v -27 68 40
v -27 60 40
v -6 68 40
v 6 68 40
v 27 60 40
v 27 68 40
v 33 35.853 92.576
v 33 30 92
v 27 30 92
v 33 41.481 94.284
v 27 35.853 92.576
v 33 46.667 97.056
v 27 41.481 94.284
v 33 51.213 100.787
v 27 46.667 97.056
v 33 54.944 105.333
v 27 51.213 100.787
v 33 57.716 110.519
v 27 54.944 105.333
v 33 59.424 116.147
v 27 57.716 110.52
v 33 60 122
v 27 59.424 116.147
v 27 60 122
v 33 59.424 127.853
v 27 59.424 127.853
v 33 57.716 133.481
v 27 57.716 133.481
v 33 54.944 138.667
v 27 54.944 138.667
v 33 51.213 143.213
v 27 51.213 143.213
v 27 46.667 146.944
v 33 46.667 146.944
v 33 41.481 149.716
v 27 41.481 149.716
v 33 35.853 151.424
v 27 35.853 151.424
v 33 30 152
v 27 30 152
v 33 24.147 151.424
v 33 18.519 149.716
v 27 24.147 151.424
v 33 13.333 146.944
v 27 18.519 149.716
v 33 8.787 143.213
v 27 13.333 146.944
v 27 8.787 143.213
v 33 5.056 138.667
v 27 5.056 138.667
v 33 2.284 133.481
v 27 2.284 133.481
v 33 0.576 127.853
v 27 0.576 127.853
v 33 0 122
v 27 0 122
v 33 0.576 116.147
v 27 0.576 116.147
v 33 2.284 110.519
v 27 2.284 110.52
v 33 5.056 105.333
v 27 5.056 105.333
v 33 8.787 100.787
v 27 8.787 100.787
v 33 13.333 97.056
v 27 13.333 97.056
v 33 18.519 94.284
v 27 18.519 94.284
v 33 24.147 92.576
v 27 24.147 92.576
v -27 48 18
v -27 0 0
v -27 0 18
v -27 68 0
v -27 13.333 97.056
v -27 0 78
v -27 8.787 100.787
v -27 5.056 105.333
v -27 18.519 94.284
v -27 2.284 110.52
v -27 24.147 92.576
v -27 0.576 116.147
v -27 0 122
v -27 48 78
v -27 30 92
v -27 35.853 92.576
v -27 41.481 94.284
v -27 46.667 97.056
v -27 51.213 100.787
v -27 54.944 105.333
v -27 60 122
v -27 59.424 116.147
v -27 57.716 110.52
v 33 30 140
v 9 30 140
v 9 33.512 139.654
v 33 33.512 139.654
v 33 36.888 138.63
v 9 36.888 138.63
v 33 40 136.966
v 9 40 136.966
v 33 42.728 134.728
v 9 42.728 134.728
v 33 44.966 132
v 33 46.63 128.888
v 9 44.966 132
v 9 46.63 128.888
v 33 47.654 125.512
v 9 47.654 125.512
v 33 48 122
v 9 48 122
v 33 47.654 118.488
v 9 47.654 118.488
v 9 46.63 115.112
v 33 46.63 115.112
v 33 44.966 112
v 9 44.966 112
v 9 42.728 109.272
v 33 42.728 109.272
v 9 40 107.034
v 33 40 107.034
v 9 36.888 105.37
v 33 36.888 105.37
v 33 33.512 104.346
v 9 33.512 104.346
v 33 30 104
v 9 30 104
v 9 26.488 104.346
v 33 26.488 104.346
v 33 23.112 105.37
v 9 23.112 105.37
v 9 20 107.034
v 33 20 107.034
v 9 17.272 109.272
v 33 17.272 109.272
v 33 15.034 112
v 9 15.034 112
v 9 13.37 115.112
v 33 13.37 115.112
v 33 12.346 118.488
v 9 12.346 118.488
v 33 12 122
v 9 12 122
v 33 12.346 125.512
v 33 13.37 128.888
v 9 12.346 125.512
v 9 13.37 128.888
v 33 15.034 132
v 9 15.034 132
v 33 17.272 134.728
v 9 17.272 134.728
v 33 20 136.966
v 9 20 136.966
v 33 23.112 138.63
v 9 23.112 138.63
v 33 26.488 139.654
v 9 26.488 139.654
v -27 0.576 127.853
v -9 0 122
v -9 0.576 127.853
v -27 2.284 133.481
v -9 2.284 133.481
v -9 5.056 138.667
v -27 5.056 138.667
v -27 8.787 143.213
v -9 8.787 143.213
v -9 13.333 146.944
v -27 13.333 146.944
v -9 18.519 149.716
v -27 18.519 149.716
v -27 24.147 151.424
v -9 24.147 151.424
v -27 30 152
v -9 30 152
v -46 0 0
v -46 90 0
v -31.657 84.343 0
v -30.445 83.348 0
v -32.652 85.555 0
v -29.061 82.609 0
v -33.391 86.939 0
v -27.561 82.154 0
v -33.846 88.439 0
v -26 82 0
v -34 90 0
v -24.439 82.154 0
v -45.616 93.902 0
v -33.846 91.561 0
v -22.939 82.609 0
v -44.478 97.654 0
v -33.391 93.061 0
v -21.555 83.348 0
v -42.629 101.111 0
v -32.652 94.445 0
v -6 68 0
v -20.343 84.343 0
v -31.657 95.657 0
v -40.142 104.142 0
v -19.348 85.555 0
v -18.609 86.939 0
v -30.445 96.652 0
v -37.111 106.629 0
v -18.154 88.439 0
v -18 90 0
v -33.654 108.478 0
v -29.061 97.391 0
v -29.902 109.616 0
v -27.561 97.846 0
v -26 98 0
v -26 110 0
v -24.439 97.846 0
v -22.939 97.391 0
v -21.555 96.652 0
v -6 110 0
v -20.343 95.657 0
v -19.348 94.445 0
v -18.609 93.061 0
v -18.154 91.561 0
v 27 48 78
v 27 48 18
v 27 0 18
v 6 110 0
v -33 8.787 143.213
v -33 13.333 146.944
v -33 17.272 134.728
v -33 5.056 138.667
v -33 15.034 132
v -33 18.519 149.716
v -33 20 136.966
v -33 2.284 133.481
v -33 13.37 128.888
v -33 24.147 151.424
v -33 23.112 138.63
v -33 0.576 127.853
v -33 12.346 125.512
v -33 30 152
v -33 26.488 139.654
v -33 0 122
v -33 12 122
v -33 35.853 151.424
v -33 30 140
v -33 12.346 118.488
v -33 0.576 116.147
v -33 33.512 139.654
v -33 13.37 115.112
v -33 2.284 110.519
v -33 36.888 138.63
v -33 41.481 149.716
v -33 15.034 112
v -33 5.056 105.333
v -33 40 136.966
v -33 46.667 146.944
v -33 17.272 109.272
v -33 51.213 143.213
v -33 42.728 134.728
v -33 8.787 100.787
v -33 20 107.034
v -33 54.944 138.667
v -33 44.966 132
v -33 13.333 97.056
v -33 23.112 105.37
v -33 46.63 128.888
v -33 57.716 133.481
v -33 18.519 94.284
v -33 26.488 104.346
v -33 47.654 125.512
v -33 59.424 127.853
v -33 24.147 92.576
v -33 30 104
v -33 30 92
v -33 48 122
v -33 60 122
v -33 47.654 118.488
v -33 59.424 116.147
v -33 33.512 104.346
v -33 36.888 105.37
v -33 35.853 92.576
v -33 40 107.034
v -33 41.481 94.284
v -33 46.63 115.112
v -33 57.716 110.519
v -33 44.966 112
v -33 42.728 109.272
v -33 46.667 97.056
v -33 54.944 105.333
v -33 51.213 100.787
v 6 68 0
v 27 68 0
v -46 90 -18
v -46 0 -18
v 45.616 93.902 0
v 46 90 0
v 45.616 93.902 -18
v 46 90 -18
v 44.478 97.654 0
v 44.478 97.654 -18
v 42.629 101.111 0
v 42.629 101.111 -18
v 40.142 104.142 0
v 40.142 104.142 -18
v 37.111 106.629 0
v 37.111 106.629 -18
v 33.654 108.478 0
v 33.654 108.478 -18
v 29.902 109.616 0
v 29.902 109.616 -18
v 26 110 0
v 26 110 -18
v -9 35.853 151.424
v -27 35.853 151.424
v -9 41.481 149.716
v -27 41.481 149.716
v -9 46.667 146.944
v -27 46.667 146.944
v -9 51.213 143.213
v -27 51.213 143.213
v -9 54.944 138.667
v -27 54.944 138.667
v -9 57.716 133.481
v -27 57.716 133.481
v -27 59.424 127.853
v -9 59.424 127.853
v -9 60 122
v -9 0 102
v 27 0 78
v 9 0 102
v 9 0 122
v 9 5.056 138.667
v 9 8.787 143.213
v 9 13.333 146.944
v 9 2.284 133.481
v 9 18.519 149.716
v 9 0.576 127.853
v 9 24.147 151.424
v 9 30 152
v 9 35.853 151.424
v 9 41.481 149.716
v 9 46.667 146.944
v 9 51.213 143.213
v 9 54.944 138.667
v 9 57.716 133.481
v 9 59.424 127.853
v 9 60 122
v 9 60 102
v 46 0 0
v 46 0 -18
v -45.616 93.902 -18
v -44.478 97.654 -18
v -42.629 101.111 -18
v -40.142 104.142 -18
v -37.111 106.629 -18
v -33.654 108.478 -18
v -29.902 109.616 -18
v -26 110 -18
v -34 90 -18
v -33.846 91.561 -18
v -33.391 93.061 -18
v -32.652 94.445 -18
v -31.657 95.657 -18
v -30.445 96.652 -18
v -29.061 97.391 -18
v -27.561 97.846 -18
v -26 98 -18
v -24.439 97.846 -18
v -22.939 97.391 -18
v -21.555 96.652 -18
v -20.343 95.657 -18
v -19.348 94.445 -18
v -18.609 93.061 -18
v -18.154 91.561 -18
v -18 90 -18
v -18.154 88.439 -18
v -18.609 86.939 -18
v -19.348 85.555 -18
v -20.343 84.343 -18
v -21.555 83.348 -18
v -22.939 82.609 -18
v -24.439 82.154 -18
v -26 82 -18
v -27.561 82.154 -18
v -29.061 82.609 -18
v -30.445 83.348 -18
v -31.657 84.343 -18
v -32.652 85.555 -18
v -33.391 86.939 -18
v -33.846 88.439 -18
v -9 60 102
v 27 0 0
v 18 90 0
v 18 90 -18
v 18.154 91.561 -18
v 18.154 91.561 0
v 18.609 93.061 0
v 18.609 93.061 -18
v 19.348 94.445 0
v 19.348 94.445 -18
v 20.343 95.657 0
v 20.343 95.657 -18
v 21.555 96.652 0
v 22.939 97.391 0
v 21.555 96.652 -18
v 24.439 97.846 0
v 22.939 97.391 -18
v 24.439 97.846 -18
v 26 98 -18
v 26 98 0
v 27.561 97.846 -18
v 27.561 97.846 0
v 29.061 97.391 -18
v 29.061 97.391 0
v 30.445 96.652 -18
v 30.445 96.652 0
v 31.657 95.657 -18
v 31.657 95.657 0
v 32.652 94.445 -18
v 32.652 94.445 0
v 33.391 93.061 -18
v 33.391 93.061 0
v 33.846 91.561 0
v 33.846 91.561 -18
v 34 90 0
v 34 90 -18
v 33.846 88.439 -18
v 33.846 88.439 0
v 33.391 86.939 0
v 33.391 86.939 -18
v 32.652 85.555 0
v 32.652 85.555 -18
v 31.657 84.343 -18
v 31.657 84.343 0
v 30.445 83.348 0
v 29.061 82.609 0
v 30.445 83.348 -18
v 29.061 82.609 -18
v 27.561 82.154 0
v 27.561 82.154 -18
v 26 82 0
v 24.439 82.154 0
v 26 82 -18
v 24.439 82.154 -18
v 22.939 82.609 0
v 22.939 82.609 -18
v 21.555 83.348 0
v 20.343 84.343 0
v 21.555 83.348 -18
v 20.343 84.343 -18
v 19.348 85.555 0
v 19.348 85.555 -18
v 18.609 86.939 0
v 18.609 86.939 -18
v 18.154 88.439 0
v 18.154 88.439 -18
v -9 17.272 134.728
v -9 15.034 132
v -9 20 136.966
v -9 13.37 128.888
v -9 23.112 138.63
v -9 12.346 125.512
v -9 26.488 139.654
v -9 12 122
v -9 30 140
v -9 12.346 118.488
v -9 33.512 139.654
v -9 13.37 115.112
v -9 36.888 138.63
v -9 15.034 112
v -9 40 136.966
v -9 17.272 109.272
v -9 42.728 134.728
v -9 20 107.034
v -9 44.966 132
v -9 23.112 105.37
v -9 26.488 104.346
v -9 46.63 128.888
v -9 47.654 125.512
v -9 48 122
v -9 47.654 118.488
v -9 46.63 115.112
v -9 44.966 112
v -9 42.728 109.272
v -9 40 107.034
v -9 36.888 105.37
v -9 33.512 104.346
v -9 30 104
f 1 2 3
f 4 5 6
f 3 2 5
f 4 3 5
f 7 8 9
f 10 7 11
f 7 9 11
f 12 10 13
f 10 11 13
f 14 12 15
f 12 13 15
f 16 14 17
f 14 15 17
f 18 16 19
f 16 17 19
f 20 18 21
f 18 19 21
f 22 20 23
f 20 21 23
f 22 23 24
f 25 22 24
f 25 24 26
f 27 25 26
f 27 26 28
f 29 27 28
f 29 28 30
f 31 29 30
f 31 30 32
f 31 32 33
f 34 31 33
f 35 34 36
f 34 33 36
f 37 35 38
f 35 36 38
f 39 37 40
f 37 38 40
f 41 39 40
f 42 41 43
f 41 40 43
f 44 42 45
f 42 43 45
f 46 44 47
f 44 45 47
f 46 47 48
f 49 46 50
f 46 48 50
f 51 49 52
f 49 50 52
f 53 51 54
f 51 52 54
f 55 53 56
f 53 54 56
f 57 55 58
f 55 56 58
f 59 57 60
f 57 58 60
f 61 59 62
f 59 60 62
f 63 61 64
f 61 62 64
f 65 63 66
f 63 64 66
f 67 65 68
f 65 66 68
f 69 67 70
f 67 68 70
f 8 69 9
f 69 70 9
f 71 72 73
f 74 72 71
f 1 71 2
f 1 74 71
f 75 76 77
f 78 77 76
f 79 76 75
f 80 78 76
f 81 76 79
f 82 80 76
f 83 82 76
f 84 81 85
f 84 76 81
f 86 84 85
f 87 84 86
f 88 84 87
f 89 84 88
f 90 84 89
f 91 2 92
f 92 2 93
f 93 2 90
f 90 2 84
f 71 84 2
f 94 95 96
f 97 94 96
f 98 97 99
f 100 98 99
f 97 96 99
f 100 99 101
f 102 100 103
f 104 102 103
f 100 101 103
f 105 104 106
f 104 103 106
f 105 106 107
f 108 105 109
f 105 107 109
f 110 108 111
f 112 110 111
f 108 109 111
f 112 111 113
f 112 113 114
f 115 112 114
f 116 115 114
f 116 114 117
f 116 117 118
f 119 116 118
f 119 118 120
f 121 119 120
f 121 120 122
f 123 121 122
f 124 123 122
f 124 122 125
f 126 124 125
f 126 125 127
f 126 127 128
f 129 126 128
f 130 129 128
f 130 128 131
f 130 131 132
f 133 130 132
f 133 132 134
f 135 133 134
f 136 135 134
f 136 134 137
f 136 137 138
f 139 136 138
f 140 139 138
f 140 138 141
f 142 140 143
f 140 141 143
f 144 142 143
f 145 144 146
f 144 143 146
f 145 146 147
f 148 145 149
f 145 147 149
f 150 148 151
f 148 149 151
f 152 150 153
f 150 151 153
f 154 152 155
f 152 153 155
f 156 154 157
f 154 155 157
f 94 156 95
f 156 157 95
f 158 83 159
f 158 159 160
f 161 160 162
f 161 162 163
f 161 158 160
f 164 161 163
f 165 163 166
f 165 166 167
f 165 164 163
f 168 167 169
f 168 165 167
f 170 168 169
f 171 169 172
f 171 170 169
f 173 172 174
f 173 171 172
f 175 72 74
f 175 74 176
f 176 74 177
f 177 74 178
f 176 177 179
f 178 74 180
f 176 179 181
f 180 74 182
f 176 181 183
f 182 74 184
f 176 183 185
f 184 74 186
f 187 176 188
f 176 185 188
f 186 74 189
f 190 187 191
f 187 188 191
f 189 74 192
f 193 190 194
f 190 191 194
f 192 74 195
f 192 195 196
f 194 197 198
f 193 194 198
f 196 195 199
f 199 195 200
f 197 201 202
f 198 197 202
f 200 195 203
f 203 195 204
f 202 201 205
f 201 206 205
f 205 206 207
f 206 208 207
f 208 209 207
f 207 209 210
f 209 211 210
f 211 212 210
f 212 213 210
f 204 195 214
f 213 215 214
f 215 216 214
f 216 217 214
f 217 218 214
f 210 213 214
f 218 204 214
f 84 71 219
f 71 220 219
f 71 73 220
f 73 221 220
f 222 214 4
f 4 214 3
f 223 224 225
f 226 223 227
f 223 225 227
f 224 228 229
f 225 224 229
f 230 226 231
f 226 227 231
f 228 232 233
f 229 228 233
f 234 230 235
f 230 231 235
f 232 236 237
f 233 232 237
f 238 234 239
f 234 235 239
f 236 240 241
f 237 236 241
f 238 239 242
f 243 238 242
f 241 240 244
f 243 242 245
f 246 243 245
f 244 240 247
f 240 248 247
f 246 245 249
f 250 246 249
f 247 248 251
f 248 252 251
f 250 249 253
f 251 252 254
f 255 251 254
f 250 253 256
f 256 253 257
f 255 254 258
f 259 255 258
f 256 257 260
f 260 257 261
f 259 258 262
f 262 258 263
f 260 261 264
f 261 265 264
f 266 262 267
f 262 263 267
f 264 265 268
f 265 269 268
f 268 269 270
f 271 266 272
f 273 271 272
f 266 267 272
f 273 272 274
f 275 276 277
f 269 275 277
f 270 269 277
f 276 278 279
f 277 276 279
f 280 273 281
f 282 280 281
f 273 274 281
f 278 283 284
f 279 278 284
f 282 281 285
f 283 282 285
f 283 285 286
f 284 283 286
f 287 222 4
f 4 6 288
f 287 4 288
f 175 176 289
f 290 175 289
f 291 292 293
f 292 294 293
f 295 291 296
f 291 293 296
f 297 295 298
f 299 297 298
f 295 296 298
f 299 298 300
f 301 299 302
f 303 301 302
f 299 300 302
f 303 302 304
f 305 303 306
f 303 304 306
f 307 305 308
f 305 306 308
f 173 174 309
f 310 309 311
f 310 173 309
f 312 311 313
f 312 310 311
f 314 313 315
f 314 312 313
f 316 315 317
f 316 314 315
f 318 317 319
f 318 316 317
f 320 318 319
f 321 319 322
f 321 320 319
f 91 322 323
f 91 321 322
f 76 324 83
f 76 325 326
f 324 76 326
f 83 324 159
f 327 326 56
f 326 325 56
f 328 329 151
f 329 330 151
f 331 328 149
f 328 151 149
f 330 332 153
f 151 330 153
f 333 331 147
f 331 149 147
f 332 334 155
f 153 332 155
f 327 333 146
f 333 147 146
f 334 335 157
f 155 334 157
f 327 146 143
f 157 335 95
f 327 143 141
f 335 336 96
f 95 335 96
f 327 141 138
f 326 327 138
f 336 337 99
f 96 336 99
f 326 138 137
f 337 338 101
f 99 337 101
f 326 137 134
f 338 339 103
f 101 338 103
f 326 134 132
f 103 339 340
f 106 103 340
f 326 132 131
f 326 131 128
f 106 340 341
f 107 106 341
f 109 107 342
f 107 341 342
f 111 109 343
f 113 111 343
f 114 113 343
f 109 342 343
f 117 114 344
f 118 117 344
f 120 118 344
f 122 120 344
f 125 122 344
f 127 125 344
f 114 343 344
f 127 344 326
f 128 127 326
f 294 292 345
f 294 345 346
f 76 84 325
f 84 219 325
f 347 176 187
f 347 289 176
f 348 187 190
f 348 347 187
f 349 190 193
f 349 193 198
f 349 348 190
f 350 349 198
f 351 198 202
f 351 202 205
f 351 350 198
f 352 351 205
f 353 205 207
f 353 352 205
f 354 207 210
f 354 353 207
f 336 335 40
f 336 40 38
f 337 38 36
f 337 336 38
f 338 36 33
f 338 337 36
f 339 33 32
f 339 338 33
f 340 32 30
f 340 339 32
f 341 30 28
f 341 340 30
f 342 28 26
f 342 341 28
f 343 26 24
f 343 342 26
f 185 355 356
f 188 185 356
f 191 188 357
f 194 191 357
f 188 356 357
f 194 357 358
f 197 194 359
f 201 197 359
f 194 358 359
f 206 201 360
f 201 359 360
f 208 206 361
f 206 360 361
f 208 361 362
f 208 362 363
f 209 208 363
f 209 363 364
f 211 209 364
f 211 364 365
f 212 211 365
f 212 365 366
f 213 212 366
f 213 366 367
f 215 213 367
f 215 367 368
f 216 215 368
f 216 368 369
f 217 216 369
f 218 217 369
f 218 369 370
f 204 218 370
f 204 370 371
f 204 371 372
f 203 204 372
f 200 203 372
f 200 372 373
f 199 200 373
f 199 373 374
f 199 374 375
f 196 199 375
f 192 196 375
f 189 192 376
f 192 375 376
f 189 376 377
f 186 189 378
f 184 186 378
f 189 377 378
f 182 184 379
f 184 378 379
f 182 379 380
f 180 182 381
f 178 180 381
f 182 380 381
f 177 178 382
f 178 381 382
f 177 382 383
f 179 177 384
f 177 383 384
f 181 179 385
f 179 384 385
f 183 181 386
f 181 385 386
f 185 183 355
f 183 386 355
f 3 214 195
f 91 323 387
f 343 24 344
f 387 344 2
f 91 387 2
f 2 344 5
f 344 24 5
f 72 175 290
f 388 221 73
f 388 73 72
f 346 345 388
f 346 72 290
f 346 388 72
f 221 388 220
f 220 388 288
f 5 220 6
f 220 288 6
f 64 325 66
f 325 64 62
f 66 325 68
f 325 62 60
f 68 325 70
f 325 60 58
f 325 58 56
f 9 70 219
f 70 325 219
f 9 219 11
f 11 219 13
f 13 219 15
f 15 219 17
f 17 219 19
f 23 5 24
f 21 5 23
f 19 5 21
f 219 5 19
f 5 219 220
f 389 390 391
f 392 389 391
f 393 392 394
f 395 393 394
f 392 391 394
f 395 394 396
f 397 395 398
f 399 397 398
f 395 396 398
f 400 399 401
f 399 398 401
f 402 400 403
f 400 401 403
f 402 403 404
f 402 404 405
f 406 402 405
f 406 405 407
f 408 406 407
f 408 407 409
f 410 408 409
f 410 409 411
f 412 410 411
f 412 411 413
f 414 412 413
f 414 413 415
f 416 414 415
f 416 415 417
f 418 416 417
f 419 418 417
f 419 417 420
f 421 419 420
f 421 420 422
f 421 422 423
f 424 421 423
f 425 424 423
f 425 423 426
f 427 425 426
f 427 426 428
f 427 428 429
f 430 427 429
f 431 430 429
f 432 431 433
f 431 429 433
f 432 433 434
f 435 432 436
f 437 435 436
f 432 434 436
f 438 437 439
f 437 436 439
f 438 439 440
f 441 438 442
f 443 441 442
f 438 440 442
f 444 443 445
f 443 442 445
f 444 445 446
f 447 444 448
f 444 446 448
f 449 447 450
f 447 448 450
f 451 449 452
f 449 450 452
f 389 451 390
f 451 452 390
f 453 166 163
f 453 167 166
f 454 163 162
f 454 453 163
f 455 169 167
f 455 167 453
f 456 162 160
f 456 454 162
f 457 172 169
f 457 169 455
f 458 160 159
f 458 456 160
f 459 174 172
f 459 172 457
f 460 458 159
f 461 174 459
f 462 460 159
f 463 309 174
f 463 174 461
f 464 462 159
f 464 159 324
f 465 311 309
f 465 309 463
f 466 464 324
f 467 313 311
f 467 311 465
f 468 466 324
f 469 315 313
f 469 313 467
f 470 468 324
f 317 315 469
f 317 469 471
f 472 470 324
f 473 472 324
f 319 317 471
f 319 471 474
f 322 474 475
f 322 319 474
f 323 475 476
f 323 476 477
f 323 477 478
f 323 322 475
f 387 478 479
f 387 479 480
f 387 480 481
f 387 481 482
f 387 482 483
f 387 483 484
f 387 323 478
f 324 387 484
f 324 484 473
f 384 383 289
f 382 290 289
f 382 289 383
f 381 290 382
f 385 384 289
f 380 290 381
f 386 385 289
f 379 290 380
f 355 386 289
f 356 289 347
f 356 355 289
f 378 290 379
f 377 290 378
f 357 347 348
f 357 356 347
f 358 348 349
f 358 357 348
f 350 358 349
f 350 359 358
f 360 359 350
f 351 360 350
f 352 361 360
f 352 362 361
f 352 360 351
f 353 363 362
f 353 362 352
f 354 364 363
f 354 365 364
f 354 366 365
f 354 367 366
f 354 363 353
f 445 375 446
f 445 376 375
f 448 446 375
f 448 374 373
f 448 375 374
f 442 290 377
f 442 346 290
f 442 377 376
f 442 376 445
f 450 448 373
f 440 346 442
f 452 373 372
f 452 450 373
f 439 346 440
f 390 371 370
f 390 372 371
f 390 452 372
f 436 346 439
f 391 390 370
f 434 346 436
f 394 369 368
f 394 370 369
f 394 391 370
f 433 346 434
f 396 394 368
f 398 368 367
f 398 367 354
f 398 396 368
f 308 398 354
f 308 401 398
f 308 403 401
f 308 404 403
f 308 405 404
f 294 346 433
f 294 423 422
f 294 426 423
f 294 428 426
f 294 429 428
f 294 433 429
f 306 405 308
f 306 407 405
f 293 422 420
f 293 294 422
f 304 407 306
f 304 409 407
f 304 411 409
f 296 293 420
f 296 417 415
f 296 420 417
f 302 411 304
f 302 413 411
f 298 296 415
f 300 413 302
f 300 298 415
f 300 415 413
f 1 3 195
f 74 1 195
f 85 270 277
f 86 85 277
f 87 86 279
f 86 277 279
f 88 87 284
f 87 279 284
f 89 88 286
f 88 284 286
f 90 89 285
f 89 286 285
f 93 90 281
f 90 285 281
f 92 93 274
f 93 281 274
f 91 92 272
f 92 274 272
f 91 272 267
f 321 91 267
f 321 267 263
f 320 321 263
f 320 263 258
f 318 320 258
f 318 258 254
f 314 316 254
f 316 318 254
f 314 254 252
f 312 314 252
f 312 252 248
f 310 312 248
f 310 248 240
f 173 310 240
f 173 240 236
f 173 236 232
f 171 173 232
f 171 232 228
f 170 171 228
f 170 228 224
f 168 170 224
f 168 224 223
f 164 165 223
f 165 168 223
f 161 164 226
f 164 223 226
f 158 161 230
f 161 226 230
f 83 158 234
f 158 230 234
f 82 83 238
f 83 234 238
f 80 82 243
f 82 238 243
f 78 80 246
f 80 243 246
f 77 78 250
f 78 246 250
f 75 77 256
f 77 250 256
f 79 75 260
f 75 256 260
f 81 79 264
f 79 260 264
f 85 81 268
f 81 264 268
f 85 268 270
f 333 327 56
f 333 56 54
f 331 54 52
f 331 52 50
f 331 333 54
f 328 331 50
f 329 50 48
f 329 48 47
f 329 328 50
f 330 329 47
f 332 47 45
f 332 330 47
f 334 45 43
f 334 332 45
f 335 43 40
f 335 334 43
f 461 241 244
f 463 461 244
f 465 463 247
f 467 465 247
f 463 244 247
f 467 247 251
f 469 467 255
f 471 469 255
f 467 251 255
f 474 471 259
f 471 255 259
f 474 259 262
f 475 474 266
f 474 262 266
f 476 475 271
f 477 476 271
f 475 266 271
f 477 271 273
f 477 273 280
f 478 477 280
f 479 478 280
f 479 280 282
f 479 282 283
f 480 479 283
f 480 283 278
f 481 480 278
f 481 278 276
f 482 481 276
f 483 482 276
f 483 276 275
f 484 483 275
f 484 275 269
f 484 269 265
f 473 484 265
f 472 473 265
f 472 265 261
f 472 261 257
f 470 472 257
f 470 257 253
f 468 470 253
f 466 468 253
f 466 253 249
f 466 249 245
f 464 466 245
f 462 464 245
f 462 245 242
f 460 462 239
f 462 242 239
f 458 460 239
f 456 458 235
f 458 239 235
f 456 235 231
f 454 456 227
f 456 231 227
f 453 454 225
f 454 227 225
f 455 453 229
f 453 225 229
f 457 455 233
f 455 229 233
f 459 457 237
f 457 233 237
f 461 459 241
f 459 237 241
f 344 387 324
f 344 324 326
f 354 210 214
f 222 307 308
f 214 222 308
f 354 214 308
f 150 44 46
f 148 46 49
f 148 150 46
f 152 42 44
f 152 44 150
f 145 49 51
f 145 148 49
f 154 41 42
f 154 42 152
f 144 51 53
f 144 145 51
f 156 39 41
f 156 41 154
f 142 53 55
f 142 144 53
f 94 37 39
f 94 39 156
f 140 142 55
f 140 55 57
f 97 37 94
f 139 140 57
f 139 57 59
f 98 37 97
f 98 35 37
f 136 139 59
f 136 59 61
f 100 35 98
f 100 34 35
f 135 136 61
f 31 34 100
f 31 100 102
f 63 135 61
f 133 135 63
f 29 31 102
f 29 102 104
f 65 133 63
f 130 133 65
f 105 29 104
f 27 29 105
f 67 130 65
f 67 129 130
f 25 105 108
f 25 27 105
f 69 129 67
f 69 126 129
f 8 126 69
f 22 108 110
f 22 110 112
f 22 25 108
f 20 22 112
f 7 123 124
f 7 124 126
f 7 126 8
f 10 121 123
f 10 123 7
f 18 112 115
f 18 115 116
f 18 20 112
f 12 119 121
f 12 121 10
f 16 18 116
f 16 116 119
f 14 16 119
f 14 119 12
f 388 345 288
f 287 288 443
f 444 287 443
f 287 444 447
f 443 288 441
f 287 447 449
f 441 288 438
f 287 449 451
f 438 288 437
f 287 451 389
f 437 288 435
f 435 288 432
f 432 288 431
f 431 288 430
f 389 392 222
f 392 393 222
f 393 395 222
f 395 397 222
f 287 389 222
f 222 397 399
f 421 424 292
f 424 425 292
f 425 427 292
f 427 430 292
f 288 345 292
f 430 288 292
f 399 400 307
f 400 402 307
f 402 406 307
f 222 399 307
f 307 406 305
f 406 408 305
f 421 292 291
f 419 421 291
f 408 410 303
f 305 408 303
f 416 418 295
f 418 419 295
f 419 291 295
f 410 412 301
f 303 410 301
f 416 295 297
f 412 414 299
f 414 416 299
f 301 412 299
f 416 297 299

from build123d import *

# Parameters (mm, degrees)
SKETCH1_W                = 18
SKETCH1_H                = 110
BOSS_EXTRUDE1_DEPTH      = 46
BOSS_EXTRUDE2_DEPTH      = 27
FILLET1_R                = 30
BOSS_EXTRUDE3_DEPTH      = 6
BOSS_EXTRUDE3_DEPTH_BACK = 60
SKETCH3_R                = 30
FILLET3_R                = 20
SKETCH4_W                = 18
SKETCH4_H                = 50
CUT_EXTRUDE1_DEPTH       = 170.764542823
HOLE1_D                  = 36
HOLE2_D                  = 16
RIB1_REACH               = 195.184
SKETCH9_WALL_W           = 446.367700514
SKETCH9_WALL_H           = 12


with BuildPart() as part:
    # Sketch1 → Boss-Extrude1 (new, symmetric)
    with BuildSketch(Plane(origin=(0, 0, 0), x_dir=(0, 0, -1), z_dir=(1, 0, 0))):
        with Locations((9, 55)):
            Rectangle(SKETCH1_W, SKETCH1_H)
    extrude(amount=BOSS_EXTRUDE1_DEPTH, both=True)

    # Sketch2 → Boss-Extrude2 (add, symmetric)
    with BuildSketch(Plane(origin=(0, 0, 0), x_dir=(0, 0, -1), z_dir=(1, 0, 0))):
        Polygon((0, 0), (-18, 0), (-18, 48), (-78, 48), (-78, 0), (-152, 0), (-152, 60), (-40, 60), (-40, 68), (0, 68), align=None)
    extrude(amount=BOSS_EXTRUDE2_DEPTH, both=True)

    # Fillet1
    fillet1_edges = [part.edges().sort_by_distance(p)[0] for p in [
        (0, 0, 152),
        (0, 60, 152),
    ]]
    fillet(fillet1_edges, radius=FILLET1_R - 0.0001)  # a hair under: the kernel refuses the full size

    # Sketch3 → Boss-Extrude3 (add, two sides: drawn at the far end of the back side and taken through both)
    with BuildSketch(Plane(origin=(27, 0, 0), x_dir=(0, 0, -1), z_dir=(1, 0, 0)).offset(-BOSS_EXTRUDE3_DEPTH_BACK)):
        with Locations((-122, 30)):
            Circle(SKETCH3_R)
    extrude(amount=BOSS_EXTRUDE3_DEPTH + BOSS_EXTRUDE3_DEPTH_BACK)

    # Fillet3
    fillet3_edges = [part.edges().sort_by_distance(p)[0] for p in [
        (46, 110, -9),
        (-46, 110, -9),
    ]]
    fillet(fillet3_edges, radius=FILLET3_R)

    # Sketch4 → Cut-Extrude1 (cut, through all)
    with BuildSketch(Plane(origin=(0, 60, 0), x_dir=(1, 0, 0), z_dir=(0, 1, 0))):
        with Locations((0, -127)):
            Rectangle(SKETCH4_W, SKETCH4_H)
    extrude(amount=-CUT_EXTRUDE1_DEPTH, mode=Mode.SUBTRACT)

    # Hole1 (through all)
    with Locations(Plane(origin=(33, 0, 0), x_dir=(0, 0, -1), z_dir=(1, 0, 0))):
        with Locations((-122, 30)):
            Hole(HOLE1_D / 2)

    # Hole2 (through all)
    with Locations(Plane.XY):
        with Locations((26, 90), (-26, 90)):
            Hole(HOLE2_D / 2)

    # Sketch9 wall → Rib1 (add, up to next)
    with BuildSketch(Plane(origin=(0, 89, 20), x_dir=(0, -0.724137931034, 0.689655172414), z_dir=(0, -0.689655172414, -0.724137931034)), mode=Mode.PRIVATE) as rib1_sk1:
        Rectangle(SKETCH9_WALL_W, SKETCH9_WALL_H)
    rib1_tool1 = extrude(rib1_sk1.sketch, amount=RIB1_REACH, mode=Mode.PRIVATE) - part.part
    add(rib1_tool1.solids().sort_by_distance((0, 89, 20))[0])


solid = part.part
